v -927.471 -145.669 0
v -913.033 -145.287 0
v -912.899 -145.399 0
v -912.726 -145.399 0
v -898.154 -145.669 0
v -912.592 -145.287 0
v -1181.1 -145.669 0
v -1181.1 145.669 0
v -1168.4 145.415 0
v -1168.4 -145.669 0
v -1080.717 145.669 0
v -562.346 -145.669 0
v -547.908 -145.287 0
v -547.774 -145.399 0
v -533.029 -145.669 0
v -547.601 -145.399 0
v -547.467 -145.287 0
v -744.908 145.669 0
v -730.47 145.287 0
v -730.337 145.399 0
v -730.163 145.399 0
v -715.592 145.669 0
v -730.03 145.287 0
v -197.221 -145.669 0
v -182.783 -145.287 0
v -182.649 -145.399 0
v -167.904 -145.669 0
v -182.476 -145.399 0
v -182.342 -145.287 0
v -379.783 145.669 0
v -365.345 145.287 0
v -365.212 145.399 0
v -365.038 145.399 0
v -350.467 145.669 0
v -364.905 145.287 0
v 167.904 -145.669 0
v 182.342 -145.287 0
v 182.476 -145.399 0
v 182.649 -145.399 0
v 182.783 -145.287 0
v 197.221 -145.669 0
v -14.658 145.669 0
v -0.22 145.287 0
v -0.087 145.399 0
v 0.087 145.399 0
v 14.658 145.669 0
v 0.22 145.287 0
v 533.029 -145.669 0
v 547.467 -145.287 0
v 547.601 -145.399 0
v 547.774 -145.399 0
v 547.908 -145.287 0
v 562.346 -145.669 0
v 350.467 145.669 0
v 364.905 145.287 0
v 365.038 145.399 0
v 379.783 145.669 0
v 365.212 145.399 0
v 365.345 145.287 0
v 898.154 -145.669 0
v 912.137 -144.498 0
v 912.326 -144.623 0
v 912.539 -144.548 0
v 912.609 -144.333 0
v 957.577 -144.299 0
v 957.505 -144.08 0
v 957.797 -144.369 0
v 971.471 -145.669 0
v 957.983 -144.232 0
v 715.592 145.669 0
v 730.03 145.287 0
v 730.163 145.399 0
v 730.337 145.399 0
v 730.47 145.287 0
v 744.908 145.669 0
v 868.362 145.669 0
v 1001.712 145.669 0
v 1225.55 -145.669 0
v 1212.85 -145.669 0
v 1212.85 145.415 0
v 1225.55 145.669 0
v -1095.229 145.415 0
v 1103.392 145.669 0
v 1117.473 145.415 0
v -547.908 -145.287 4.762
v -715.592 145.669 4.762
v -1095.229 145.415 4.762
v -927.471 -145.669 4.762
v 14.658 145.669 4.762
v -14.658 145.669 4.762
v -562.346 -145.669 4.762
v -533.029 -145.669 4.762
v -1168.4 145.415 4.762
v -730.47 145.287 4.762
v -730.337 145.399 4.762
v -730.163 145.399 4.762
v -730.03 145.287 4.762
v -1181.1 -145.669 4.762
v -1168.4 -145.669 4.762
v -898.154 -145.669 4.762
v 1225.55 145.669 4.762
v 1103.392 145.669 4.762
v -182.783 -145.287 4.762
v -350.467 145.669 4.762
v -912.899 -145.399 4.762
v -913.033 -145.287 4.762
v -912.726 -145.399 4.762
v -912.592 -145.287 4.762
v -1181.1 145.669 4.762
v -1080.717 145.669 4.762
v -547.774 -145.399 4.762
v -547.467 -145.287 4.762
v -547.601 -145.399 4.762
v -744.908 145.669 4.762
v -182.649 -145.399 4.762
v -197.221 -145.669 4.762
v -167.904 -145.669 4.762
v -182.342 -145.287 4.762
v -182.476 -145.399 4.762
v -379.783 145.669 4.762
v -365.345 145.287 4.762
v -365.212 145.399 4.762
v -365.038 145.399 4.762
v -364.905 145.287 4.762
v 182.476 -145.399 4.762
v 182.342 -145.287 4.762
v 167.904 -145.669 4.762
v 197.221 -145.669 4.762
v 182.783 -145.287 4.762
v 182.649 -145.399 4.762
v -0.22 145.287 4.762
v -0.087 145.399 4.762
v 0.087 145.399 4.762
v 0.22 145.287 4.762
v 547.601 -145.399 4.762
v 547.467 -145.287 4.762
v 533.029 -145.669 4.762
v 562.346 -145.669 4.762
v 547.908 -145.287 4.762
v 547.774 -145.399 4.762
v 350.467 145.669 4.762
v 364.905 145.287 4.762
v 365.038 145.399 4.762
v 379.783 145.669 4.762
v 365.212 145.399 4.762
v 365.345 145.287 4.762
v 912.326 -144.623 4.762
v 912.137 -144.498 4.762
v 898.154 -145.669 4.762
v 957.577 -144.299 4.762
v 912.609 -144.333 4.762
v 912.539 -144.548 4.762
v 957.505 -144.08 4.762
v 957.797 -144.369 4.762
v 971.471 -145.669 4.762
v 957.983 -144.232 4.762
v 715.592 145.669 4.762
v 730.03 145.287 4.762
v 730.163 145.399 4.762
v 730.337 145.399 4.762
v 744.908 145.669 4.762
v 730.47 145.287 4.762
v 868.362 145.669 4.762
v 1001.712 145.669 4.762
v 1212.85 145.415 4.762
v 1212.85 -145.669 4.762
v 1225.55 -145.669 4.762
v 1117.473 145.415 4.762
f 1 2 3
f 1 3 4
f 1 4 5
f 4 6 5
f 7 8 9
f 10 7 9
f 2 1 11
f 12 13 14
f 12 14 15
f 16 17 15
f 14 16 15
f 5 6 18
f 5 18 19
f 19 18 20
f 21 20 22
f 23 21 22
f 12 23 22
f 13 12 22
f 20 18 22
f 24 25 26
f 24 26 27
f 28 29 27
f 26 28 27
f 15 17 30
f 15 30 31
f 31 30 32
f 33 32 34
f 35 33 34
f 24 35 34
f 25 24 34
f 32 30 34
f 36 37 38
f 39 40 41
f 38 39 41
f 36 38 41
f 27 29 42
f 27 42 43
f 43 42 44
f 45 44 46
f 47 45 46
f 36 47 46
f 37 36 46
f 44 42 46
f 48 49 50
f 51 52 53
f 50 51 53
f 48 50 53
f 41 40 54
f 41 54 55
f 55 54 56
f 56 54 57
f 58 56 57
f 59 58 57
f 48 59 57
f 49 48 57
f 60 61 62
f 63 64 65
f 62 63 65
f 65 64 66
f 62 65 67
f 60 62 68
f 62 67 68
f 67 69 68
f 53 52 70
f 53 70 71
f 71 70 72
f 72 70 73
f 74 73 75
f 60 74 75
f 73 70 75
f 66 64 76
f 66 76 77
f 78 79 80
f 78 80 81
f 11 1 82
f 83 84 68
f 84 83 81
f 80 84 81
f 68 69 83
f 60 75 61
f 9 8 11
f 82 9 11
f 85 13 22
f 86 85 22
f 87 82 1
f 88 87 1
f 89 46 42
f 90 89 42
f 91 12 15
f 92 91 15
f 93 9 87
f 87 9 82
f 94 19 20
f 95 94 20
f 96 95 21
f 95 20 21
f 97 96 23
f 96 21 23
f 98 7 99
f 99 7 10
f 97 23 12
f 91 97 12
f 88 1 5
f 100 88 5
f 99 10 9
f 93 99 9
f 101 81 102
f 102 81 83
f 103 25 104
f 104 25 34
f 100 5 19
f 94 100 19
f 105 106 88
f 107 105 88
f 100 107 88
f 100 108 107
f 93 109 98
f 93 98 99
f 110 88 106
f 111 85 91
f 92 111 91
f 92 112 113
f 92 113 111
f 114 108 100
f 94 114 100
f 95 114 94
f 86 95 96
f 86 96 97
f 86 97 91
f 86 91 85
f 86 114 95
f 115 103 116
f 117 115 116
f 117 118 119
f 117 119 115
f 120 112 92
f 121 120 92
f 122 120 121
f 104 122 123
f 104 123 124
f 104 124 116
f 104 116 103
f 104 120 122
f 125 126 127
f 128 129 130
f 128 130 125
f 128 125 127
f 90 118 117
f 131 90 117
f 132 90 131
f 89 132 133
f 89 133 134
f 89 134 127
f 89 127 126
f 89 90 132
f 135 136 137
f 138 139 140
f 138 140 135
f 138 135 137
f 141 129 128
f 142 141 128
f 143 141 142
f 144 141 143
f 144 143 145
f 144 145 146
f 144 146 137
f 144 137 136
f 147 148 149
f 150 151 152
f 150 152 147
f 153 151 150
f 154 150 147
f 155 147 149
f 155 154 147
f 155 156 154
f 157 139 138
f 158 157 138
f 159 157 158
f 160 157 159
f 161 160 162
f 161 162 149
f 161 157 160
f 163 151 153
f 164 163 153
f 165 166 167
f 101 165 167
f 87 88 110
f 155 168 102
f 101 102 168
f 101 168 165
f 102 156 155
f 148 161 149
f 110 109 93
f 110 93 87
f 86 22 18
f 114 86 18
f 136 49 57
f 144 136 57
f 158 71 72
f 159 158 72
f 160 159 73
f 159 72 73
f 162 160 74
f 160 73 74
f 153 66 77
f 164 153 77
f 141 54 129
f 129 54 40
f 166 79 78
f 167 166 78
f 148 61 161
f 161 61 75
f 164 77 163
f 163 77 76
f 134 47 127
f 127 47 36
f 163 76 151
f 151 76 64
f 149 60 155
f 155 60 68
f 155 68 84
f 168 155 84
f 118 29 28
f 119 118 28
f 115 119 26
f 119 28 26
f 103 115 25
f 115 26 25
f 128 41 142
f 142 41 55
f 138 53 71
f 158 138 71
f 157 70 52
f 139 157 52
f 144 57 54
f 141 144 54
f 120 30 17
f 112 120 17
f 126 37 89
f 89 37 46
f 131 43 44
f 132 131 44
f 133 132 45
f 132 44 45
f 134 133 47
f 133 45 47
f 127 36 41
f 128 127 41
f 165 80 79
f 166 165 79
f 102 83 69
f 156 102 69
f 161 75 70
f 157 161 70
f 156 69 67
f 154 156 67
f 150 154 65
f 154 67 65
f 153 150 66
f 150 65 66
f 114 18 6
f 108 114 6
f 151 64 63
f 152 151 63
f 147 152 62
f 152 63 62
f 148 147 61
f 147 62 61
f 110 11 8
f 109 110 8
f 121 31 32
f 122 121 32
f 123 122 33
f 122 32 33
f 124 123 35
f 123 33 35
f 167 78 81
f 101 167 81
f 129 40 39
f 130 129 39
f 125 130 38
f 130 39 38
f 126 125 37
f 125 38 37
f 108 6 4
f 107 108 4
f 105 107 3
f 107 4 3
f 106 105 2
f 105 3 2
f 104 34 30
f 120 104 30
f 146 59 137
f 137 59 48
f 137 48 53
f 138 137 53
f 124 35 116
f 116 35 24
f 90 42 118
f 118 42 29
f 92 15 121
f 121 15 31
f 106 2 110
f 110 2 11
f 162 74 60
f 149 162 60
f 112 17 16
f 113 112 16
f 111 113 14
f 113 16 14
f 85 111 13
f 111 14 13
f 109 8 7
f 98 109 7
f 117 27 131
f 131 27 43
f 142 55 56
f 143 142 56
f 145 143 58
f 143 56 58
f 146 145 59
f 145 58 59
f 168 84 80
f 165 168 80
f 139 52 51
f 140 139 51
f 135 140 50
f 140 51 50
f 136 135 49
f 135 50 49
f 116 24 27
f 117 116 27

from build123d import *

# Parameters (mm, degrees)
F0_W     = 12.7
F0_H     = 0.254
F0_H_2   = 291.084
F0_W_2   = 9.525
F1_DEPTH = 4.7625


# Not quite as in the source:
# - a feature names something its author has since deleted; it is built from what else it names


with BuildPart() as f1:
    # F0 (on Top) → F1 (new body)
    with BuildSketch(Plane.XY):
        Polygon((-1095.375, 145.669), (-1168.4, 145.669), (-1168.4, 145.415), (-1095.2286143575, 145.415), align=None)
        with Locations((-1174.75, 145.542)):
            Rectangle(F0_W, F0_H)
        with Locations((-1174.75, -0.127)):
            Rectangle(F0_W, F0_H_2)
        with BuildLine():
            Line((1001.7125, 145.669), (935.0375, 145.669))
            Line((935.0375, 145.669), (935.0375, -145.669))
            Line((935.0375, -145.669), (971.4705200239, -145.669))
            Line((971.4705200239, -145.669), (1117.4725985353, 145.415))
            Line((1117.4725985353, 145.415), (1117.6, 145.669))
            Line((1117.6, 145.669), (1103.3919799761, 145.669))
            Line((1103.3919799761, 145.669), (957.9830261901, -144.232488632))
            ThreePointArc((957.9830261901, -144.232488632), (957.67894626, -144.3606444457), (957.5048911047, -144.080299445))
            Line((957.5048911047, -144.080299445), (1001.7125, 145.669))
        make_face()
        with BuildLine():
            Line((-1080.7168319418, 145.669), (-1095.375, 145.669))
            Line((-1095.375, 145.669), (-1095.2286143575, 145.415))
            Line((-1095.2286143575, 145.415), (-927.4706680582, -145.669))
            Line((-927.4706680582, -145.669), (-898.1543319418, -145.669))
            Line((-898.1543319418, -145.669), (-730.4700684279, 145.2871498423))
            ThreePointArc((-730.4700684279, 145.2871498423), (-730.25, 145.4143196918), (-730.0299315721, 145.2871498423))
            Line((-730.0299315721, 145.2871498423), (-562.3456680582, -145.669))
            Line((-562.3456680582, -145.669), (-533.0293319418, -145.669))
            Line((-533.0293319418, -145.669), (-365.3450684279, 145.2871498423))
            ThreePointArc((-365.3450684279, 145.2871498423), (-365.125, 145.4143196918), (-364.9049315721, 145.2871498423))
            Line((-364.9049315721, 145.2871498423), (-197.2206680582, -145.669))
            Line((-197.2206680582, -145.669), (-167.9043319418, -145.669))
            Line((-167.9043319418, -145.669), (-0.2200684279, 145.2871498423))
            ThreePointArc((-0.2200684279, 145.2871498423), (0, 145.4143196918), (0.2200684279, 145.2871498423))
            Line((0.2200684279, 145.2871498423), (167.9043319418, -145.669))
            Line((167.9043319418, -145.669), (197.2206680582, -145.669))
            Line((197.2206680582, -145.669), (364.9049315721, 145.2871498423))
            ThreePointArc((364.9049315721, 145.2871498423), (365.125, 145.4143196918), (365.3450684279, 145.2871498423))
            Line((365.3450684279, 145.2871498423), (533.0293319418, -145.669))
            Line((533.0293319418, -145.669), (562.3456680582, -145.669))
            Line((562.3456680582, -145.669), (730.0299315721, 145.2871498423))
            ThreePointArc((730.0299315721, 145.2871498423), (730.25, 145.4143196918), (730.4700684279, 145.2871498423))
            Line((730.4700684279, 145.2871498423), (898.1543319418, -145.669))
            Line((898.1543319418, -145.669), (935.0375, -145.669))
            Line((935.0375, -145.669), (935.0375, 145.669))
            Line((935.0375, 145.669), (868.3625, 145.669))
            Line((868.3625, 145.669), (912.6085893136, -144.3325111014))
            ThreePointArc((912.6085893136, -144.3325111014), (912.4415096754, -144.6105240597), (912.137426584, -144.4976511932))
            Line((912.137426584, -144.4976511932), (744.9081680582, 145.669))
            Line((744.9081680582, 145.669), (715.5918319418, 145.669))
            Line((715.5918319418, 145.669), (547.9075684279, -145.2871498423))
            ThreePointArc((547.9075684279, -145.2871498423), (547.6875, -145.4143196918), (547.4674315721, -145.2871498423))
            Line((547.4674315721, -145.2871498423), (379.7831680582, 145.669))
            Line((379.7831680582, 145.669), (350.4668319418, 145.669))
            Line((350.4668319418, 145.669), (182.7825684279, -145.2871498423))
            ThreePointArc((182.7825684279, -145.2871498423), (182.5625, -145.4143196918), (182.3424315721, -145.2871498423))
            Line((182.3424315721, -145.2871498423), (14.6581680582, 145.669))
            Line((14.6581680582, 145.669), (-14.6581680582, 145.669))
            Line((-14.6581680582, 145.669), (-182.3424315721, -145.2871498423))
            ThreePointArc((-182.3424315721, -145.2871498423), (-182.5625, -145.4143196918), (-182.7825684279, -145.2871498423))
            Line((-182.7825684279, -145.2871498423), (-350.4668319418, 145.669))
            Line((-350.4668319418, 145.669), (-379.7831680582, 145.669))
            Line((-379.7831680582, 145.669), (-547.4674315721, -145.2871498423))
            ThreePointArc((-547.4674315721, -145.2871498423), (-547.6875, -145.4143196918), (-547.9075684279, -145.2871498423))
            Line((-547.9075684279, -145.2871498423), (-715.5918319418, 145.669))
            Line((-715.5918319418, 145.669), (-744.9081680582, 145.669))
            Line((-744.9081680582, 145.669), (-912.5924315721, -145.2871498423))
            ThreePointArc((-912.5924315721, -145.2871498423), (-912.8125, -145.4143196918), (-913.0325684279, -145.2871498423))
            Line((-913.0325684279, -145.2871498423), (-1080.7168319418, 145.669))
        make_face()
        Polygon((1212.85, 145.415), (1212.85, -145.669), (1225.55, -145.669), (1225.55, 145.669), (1212.85, 145.669), align=None)
        Polygon((1117.6, 145.669), (1117.4725985353, 145.415), (1203.325, 145.415), (1203.325, 145.669), align=None)
        with Locations((1208.0875, 145.542)):
            Rectangle(F0_W_2, F0_H)
    extrude(amount=F1_DEPTH)


solid = f1.part
